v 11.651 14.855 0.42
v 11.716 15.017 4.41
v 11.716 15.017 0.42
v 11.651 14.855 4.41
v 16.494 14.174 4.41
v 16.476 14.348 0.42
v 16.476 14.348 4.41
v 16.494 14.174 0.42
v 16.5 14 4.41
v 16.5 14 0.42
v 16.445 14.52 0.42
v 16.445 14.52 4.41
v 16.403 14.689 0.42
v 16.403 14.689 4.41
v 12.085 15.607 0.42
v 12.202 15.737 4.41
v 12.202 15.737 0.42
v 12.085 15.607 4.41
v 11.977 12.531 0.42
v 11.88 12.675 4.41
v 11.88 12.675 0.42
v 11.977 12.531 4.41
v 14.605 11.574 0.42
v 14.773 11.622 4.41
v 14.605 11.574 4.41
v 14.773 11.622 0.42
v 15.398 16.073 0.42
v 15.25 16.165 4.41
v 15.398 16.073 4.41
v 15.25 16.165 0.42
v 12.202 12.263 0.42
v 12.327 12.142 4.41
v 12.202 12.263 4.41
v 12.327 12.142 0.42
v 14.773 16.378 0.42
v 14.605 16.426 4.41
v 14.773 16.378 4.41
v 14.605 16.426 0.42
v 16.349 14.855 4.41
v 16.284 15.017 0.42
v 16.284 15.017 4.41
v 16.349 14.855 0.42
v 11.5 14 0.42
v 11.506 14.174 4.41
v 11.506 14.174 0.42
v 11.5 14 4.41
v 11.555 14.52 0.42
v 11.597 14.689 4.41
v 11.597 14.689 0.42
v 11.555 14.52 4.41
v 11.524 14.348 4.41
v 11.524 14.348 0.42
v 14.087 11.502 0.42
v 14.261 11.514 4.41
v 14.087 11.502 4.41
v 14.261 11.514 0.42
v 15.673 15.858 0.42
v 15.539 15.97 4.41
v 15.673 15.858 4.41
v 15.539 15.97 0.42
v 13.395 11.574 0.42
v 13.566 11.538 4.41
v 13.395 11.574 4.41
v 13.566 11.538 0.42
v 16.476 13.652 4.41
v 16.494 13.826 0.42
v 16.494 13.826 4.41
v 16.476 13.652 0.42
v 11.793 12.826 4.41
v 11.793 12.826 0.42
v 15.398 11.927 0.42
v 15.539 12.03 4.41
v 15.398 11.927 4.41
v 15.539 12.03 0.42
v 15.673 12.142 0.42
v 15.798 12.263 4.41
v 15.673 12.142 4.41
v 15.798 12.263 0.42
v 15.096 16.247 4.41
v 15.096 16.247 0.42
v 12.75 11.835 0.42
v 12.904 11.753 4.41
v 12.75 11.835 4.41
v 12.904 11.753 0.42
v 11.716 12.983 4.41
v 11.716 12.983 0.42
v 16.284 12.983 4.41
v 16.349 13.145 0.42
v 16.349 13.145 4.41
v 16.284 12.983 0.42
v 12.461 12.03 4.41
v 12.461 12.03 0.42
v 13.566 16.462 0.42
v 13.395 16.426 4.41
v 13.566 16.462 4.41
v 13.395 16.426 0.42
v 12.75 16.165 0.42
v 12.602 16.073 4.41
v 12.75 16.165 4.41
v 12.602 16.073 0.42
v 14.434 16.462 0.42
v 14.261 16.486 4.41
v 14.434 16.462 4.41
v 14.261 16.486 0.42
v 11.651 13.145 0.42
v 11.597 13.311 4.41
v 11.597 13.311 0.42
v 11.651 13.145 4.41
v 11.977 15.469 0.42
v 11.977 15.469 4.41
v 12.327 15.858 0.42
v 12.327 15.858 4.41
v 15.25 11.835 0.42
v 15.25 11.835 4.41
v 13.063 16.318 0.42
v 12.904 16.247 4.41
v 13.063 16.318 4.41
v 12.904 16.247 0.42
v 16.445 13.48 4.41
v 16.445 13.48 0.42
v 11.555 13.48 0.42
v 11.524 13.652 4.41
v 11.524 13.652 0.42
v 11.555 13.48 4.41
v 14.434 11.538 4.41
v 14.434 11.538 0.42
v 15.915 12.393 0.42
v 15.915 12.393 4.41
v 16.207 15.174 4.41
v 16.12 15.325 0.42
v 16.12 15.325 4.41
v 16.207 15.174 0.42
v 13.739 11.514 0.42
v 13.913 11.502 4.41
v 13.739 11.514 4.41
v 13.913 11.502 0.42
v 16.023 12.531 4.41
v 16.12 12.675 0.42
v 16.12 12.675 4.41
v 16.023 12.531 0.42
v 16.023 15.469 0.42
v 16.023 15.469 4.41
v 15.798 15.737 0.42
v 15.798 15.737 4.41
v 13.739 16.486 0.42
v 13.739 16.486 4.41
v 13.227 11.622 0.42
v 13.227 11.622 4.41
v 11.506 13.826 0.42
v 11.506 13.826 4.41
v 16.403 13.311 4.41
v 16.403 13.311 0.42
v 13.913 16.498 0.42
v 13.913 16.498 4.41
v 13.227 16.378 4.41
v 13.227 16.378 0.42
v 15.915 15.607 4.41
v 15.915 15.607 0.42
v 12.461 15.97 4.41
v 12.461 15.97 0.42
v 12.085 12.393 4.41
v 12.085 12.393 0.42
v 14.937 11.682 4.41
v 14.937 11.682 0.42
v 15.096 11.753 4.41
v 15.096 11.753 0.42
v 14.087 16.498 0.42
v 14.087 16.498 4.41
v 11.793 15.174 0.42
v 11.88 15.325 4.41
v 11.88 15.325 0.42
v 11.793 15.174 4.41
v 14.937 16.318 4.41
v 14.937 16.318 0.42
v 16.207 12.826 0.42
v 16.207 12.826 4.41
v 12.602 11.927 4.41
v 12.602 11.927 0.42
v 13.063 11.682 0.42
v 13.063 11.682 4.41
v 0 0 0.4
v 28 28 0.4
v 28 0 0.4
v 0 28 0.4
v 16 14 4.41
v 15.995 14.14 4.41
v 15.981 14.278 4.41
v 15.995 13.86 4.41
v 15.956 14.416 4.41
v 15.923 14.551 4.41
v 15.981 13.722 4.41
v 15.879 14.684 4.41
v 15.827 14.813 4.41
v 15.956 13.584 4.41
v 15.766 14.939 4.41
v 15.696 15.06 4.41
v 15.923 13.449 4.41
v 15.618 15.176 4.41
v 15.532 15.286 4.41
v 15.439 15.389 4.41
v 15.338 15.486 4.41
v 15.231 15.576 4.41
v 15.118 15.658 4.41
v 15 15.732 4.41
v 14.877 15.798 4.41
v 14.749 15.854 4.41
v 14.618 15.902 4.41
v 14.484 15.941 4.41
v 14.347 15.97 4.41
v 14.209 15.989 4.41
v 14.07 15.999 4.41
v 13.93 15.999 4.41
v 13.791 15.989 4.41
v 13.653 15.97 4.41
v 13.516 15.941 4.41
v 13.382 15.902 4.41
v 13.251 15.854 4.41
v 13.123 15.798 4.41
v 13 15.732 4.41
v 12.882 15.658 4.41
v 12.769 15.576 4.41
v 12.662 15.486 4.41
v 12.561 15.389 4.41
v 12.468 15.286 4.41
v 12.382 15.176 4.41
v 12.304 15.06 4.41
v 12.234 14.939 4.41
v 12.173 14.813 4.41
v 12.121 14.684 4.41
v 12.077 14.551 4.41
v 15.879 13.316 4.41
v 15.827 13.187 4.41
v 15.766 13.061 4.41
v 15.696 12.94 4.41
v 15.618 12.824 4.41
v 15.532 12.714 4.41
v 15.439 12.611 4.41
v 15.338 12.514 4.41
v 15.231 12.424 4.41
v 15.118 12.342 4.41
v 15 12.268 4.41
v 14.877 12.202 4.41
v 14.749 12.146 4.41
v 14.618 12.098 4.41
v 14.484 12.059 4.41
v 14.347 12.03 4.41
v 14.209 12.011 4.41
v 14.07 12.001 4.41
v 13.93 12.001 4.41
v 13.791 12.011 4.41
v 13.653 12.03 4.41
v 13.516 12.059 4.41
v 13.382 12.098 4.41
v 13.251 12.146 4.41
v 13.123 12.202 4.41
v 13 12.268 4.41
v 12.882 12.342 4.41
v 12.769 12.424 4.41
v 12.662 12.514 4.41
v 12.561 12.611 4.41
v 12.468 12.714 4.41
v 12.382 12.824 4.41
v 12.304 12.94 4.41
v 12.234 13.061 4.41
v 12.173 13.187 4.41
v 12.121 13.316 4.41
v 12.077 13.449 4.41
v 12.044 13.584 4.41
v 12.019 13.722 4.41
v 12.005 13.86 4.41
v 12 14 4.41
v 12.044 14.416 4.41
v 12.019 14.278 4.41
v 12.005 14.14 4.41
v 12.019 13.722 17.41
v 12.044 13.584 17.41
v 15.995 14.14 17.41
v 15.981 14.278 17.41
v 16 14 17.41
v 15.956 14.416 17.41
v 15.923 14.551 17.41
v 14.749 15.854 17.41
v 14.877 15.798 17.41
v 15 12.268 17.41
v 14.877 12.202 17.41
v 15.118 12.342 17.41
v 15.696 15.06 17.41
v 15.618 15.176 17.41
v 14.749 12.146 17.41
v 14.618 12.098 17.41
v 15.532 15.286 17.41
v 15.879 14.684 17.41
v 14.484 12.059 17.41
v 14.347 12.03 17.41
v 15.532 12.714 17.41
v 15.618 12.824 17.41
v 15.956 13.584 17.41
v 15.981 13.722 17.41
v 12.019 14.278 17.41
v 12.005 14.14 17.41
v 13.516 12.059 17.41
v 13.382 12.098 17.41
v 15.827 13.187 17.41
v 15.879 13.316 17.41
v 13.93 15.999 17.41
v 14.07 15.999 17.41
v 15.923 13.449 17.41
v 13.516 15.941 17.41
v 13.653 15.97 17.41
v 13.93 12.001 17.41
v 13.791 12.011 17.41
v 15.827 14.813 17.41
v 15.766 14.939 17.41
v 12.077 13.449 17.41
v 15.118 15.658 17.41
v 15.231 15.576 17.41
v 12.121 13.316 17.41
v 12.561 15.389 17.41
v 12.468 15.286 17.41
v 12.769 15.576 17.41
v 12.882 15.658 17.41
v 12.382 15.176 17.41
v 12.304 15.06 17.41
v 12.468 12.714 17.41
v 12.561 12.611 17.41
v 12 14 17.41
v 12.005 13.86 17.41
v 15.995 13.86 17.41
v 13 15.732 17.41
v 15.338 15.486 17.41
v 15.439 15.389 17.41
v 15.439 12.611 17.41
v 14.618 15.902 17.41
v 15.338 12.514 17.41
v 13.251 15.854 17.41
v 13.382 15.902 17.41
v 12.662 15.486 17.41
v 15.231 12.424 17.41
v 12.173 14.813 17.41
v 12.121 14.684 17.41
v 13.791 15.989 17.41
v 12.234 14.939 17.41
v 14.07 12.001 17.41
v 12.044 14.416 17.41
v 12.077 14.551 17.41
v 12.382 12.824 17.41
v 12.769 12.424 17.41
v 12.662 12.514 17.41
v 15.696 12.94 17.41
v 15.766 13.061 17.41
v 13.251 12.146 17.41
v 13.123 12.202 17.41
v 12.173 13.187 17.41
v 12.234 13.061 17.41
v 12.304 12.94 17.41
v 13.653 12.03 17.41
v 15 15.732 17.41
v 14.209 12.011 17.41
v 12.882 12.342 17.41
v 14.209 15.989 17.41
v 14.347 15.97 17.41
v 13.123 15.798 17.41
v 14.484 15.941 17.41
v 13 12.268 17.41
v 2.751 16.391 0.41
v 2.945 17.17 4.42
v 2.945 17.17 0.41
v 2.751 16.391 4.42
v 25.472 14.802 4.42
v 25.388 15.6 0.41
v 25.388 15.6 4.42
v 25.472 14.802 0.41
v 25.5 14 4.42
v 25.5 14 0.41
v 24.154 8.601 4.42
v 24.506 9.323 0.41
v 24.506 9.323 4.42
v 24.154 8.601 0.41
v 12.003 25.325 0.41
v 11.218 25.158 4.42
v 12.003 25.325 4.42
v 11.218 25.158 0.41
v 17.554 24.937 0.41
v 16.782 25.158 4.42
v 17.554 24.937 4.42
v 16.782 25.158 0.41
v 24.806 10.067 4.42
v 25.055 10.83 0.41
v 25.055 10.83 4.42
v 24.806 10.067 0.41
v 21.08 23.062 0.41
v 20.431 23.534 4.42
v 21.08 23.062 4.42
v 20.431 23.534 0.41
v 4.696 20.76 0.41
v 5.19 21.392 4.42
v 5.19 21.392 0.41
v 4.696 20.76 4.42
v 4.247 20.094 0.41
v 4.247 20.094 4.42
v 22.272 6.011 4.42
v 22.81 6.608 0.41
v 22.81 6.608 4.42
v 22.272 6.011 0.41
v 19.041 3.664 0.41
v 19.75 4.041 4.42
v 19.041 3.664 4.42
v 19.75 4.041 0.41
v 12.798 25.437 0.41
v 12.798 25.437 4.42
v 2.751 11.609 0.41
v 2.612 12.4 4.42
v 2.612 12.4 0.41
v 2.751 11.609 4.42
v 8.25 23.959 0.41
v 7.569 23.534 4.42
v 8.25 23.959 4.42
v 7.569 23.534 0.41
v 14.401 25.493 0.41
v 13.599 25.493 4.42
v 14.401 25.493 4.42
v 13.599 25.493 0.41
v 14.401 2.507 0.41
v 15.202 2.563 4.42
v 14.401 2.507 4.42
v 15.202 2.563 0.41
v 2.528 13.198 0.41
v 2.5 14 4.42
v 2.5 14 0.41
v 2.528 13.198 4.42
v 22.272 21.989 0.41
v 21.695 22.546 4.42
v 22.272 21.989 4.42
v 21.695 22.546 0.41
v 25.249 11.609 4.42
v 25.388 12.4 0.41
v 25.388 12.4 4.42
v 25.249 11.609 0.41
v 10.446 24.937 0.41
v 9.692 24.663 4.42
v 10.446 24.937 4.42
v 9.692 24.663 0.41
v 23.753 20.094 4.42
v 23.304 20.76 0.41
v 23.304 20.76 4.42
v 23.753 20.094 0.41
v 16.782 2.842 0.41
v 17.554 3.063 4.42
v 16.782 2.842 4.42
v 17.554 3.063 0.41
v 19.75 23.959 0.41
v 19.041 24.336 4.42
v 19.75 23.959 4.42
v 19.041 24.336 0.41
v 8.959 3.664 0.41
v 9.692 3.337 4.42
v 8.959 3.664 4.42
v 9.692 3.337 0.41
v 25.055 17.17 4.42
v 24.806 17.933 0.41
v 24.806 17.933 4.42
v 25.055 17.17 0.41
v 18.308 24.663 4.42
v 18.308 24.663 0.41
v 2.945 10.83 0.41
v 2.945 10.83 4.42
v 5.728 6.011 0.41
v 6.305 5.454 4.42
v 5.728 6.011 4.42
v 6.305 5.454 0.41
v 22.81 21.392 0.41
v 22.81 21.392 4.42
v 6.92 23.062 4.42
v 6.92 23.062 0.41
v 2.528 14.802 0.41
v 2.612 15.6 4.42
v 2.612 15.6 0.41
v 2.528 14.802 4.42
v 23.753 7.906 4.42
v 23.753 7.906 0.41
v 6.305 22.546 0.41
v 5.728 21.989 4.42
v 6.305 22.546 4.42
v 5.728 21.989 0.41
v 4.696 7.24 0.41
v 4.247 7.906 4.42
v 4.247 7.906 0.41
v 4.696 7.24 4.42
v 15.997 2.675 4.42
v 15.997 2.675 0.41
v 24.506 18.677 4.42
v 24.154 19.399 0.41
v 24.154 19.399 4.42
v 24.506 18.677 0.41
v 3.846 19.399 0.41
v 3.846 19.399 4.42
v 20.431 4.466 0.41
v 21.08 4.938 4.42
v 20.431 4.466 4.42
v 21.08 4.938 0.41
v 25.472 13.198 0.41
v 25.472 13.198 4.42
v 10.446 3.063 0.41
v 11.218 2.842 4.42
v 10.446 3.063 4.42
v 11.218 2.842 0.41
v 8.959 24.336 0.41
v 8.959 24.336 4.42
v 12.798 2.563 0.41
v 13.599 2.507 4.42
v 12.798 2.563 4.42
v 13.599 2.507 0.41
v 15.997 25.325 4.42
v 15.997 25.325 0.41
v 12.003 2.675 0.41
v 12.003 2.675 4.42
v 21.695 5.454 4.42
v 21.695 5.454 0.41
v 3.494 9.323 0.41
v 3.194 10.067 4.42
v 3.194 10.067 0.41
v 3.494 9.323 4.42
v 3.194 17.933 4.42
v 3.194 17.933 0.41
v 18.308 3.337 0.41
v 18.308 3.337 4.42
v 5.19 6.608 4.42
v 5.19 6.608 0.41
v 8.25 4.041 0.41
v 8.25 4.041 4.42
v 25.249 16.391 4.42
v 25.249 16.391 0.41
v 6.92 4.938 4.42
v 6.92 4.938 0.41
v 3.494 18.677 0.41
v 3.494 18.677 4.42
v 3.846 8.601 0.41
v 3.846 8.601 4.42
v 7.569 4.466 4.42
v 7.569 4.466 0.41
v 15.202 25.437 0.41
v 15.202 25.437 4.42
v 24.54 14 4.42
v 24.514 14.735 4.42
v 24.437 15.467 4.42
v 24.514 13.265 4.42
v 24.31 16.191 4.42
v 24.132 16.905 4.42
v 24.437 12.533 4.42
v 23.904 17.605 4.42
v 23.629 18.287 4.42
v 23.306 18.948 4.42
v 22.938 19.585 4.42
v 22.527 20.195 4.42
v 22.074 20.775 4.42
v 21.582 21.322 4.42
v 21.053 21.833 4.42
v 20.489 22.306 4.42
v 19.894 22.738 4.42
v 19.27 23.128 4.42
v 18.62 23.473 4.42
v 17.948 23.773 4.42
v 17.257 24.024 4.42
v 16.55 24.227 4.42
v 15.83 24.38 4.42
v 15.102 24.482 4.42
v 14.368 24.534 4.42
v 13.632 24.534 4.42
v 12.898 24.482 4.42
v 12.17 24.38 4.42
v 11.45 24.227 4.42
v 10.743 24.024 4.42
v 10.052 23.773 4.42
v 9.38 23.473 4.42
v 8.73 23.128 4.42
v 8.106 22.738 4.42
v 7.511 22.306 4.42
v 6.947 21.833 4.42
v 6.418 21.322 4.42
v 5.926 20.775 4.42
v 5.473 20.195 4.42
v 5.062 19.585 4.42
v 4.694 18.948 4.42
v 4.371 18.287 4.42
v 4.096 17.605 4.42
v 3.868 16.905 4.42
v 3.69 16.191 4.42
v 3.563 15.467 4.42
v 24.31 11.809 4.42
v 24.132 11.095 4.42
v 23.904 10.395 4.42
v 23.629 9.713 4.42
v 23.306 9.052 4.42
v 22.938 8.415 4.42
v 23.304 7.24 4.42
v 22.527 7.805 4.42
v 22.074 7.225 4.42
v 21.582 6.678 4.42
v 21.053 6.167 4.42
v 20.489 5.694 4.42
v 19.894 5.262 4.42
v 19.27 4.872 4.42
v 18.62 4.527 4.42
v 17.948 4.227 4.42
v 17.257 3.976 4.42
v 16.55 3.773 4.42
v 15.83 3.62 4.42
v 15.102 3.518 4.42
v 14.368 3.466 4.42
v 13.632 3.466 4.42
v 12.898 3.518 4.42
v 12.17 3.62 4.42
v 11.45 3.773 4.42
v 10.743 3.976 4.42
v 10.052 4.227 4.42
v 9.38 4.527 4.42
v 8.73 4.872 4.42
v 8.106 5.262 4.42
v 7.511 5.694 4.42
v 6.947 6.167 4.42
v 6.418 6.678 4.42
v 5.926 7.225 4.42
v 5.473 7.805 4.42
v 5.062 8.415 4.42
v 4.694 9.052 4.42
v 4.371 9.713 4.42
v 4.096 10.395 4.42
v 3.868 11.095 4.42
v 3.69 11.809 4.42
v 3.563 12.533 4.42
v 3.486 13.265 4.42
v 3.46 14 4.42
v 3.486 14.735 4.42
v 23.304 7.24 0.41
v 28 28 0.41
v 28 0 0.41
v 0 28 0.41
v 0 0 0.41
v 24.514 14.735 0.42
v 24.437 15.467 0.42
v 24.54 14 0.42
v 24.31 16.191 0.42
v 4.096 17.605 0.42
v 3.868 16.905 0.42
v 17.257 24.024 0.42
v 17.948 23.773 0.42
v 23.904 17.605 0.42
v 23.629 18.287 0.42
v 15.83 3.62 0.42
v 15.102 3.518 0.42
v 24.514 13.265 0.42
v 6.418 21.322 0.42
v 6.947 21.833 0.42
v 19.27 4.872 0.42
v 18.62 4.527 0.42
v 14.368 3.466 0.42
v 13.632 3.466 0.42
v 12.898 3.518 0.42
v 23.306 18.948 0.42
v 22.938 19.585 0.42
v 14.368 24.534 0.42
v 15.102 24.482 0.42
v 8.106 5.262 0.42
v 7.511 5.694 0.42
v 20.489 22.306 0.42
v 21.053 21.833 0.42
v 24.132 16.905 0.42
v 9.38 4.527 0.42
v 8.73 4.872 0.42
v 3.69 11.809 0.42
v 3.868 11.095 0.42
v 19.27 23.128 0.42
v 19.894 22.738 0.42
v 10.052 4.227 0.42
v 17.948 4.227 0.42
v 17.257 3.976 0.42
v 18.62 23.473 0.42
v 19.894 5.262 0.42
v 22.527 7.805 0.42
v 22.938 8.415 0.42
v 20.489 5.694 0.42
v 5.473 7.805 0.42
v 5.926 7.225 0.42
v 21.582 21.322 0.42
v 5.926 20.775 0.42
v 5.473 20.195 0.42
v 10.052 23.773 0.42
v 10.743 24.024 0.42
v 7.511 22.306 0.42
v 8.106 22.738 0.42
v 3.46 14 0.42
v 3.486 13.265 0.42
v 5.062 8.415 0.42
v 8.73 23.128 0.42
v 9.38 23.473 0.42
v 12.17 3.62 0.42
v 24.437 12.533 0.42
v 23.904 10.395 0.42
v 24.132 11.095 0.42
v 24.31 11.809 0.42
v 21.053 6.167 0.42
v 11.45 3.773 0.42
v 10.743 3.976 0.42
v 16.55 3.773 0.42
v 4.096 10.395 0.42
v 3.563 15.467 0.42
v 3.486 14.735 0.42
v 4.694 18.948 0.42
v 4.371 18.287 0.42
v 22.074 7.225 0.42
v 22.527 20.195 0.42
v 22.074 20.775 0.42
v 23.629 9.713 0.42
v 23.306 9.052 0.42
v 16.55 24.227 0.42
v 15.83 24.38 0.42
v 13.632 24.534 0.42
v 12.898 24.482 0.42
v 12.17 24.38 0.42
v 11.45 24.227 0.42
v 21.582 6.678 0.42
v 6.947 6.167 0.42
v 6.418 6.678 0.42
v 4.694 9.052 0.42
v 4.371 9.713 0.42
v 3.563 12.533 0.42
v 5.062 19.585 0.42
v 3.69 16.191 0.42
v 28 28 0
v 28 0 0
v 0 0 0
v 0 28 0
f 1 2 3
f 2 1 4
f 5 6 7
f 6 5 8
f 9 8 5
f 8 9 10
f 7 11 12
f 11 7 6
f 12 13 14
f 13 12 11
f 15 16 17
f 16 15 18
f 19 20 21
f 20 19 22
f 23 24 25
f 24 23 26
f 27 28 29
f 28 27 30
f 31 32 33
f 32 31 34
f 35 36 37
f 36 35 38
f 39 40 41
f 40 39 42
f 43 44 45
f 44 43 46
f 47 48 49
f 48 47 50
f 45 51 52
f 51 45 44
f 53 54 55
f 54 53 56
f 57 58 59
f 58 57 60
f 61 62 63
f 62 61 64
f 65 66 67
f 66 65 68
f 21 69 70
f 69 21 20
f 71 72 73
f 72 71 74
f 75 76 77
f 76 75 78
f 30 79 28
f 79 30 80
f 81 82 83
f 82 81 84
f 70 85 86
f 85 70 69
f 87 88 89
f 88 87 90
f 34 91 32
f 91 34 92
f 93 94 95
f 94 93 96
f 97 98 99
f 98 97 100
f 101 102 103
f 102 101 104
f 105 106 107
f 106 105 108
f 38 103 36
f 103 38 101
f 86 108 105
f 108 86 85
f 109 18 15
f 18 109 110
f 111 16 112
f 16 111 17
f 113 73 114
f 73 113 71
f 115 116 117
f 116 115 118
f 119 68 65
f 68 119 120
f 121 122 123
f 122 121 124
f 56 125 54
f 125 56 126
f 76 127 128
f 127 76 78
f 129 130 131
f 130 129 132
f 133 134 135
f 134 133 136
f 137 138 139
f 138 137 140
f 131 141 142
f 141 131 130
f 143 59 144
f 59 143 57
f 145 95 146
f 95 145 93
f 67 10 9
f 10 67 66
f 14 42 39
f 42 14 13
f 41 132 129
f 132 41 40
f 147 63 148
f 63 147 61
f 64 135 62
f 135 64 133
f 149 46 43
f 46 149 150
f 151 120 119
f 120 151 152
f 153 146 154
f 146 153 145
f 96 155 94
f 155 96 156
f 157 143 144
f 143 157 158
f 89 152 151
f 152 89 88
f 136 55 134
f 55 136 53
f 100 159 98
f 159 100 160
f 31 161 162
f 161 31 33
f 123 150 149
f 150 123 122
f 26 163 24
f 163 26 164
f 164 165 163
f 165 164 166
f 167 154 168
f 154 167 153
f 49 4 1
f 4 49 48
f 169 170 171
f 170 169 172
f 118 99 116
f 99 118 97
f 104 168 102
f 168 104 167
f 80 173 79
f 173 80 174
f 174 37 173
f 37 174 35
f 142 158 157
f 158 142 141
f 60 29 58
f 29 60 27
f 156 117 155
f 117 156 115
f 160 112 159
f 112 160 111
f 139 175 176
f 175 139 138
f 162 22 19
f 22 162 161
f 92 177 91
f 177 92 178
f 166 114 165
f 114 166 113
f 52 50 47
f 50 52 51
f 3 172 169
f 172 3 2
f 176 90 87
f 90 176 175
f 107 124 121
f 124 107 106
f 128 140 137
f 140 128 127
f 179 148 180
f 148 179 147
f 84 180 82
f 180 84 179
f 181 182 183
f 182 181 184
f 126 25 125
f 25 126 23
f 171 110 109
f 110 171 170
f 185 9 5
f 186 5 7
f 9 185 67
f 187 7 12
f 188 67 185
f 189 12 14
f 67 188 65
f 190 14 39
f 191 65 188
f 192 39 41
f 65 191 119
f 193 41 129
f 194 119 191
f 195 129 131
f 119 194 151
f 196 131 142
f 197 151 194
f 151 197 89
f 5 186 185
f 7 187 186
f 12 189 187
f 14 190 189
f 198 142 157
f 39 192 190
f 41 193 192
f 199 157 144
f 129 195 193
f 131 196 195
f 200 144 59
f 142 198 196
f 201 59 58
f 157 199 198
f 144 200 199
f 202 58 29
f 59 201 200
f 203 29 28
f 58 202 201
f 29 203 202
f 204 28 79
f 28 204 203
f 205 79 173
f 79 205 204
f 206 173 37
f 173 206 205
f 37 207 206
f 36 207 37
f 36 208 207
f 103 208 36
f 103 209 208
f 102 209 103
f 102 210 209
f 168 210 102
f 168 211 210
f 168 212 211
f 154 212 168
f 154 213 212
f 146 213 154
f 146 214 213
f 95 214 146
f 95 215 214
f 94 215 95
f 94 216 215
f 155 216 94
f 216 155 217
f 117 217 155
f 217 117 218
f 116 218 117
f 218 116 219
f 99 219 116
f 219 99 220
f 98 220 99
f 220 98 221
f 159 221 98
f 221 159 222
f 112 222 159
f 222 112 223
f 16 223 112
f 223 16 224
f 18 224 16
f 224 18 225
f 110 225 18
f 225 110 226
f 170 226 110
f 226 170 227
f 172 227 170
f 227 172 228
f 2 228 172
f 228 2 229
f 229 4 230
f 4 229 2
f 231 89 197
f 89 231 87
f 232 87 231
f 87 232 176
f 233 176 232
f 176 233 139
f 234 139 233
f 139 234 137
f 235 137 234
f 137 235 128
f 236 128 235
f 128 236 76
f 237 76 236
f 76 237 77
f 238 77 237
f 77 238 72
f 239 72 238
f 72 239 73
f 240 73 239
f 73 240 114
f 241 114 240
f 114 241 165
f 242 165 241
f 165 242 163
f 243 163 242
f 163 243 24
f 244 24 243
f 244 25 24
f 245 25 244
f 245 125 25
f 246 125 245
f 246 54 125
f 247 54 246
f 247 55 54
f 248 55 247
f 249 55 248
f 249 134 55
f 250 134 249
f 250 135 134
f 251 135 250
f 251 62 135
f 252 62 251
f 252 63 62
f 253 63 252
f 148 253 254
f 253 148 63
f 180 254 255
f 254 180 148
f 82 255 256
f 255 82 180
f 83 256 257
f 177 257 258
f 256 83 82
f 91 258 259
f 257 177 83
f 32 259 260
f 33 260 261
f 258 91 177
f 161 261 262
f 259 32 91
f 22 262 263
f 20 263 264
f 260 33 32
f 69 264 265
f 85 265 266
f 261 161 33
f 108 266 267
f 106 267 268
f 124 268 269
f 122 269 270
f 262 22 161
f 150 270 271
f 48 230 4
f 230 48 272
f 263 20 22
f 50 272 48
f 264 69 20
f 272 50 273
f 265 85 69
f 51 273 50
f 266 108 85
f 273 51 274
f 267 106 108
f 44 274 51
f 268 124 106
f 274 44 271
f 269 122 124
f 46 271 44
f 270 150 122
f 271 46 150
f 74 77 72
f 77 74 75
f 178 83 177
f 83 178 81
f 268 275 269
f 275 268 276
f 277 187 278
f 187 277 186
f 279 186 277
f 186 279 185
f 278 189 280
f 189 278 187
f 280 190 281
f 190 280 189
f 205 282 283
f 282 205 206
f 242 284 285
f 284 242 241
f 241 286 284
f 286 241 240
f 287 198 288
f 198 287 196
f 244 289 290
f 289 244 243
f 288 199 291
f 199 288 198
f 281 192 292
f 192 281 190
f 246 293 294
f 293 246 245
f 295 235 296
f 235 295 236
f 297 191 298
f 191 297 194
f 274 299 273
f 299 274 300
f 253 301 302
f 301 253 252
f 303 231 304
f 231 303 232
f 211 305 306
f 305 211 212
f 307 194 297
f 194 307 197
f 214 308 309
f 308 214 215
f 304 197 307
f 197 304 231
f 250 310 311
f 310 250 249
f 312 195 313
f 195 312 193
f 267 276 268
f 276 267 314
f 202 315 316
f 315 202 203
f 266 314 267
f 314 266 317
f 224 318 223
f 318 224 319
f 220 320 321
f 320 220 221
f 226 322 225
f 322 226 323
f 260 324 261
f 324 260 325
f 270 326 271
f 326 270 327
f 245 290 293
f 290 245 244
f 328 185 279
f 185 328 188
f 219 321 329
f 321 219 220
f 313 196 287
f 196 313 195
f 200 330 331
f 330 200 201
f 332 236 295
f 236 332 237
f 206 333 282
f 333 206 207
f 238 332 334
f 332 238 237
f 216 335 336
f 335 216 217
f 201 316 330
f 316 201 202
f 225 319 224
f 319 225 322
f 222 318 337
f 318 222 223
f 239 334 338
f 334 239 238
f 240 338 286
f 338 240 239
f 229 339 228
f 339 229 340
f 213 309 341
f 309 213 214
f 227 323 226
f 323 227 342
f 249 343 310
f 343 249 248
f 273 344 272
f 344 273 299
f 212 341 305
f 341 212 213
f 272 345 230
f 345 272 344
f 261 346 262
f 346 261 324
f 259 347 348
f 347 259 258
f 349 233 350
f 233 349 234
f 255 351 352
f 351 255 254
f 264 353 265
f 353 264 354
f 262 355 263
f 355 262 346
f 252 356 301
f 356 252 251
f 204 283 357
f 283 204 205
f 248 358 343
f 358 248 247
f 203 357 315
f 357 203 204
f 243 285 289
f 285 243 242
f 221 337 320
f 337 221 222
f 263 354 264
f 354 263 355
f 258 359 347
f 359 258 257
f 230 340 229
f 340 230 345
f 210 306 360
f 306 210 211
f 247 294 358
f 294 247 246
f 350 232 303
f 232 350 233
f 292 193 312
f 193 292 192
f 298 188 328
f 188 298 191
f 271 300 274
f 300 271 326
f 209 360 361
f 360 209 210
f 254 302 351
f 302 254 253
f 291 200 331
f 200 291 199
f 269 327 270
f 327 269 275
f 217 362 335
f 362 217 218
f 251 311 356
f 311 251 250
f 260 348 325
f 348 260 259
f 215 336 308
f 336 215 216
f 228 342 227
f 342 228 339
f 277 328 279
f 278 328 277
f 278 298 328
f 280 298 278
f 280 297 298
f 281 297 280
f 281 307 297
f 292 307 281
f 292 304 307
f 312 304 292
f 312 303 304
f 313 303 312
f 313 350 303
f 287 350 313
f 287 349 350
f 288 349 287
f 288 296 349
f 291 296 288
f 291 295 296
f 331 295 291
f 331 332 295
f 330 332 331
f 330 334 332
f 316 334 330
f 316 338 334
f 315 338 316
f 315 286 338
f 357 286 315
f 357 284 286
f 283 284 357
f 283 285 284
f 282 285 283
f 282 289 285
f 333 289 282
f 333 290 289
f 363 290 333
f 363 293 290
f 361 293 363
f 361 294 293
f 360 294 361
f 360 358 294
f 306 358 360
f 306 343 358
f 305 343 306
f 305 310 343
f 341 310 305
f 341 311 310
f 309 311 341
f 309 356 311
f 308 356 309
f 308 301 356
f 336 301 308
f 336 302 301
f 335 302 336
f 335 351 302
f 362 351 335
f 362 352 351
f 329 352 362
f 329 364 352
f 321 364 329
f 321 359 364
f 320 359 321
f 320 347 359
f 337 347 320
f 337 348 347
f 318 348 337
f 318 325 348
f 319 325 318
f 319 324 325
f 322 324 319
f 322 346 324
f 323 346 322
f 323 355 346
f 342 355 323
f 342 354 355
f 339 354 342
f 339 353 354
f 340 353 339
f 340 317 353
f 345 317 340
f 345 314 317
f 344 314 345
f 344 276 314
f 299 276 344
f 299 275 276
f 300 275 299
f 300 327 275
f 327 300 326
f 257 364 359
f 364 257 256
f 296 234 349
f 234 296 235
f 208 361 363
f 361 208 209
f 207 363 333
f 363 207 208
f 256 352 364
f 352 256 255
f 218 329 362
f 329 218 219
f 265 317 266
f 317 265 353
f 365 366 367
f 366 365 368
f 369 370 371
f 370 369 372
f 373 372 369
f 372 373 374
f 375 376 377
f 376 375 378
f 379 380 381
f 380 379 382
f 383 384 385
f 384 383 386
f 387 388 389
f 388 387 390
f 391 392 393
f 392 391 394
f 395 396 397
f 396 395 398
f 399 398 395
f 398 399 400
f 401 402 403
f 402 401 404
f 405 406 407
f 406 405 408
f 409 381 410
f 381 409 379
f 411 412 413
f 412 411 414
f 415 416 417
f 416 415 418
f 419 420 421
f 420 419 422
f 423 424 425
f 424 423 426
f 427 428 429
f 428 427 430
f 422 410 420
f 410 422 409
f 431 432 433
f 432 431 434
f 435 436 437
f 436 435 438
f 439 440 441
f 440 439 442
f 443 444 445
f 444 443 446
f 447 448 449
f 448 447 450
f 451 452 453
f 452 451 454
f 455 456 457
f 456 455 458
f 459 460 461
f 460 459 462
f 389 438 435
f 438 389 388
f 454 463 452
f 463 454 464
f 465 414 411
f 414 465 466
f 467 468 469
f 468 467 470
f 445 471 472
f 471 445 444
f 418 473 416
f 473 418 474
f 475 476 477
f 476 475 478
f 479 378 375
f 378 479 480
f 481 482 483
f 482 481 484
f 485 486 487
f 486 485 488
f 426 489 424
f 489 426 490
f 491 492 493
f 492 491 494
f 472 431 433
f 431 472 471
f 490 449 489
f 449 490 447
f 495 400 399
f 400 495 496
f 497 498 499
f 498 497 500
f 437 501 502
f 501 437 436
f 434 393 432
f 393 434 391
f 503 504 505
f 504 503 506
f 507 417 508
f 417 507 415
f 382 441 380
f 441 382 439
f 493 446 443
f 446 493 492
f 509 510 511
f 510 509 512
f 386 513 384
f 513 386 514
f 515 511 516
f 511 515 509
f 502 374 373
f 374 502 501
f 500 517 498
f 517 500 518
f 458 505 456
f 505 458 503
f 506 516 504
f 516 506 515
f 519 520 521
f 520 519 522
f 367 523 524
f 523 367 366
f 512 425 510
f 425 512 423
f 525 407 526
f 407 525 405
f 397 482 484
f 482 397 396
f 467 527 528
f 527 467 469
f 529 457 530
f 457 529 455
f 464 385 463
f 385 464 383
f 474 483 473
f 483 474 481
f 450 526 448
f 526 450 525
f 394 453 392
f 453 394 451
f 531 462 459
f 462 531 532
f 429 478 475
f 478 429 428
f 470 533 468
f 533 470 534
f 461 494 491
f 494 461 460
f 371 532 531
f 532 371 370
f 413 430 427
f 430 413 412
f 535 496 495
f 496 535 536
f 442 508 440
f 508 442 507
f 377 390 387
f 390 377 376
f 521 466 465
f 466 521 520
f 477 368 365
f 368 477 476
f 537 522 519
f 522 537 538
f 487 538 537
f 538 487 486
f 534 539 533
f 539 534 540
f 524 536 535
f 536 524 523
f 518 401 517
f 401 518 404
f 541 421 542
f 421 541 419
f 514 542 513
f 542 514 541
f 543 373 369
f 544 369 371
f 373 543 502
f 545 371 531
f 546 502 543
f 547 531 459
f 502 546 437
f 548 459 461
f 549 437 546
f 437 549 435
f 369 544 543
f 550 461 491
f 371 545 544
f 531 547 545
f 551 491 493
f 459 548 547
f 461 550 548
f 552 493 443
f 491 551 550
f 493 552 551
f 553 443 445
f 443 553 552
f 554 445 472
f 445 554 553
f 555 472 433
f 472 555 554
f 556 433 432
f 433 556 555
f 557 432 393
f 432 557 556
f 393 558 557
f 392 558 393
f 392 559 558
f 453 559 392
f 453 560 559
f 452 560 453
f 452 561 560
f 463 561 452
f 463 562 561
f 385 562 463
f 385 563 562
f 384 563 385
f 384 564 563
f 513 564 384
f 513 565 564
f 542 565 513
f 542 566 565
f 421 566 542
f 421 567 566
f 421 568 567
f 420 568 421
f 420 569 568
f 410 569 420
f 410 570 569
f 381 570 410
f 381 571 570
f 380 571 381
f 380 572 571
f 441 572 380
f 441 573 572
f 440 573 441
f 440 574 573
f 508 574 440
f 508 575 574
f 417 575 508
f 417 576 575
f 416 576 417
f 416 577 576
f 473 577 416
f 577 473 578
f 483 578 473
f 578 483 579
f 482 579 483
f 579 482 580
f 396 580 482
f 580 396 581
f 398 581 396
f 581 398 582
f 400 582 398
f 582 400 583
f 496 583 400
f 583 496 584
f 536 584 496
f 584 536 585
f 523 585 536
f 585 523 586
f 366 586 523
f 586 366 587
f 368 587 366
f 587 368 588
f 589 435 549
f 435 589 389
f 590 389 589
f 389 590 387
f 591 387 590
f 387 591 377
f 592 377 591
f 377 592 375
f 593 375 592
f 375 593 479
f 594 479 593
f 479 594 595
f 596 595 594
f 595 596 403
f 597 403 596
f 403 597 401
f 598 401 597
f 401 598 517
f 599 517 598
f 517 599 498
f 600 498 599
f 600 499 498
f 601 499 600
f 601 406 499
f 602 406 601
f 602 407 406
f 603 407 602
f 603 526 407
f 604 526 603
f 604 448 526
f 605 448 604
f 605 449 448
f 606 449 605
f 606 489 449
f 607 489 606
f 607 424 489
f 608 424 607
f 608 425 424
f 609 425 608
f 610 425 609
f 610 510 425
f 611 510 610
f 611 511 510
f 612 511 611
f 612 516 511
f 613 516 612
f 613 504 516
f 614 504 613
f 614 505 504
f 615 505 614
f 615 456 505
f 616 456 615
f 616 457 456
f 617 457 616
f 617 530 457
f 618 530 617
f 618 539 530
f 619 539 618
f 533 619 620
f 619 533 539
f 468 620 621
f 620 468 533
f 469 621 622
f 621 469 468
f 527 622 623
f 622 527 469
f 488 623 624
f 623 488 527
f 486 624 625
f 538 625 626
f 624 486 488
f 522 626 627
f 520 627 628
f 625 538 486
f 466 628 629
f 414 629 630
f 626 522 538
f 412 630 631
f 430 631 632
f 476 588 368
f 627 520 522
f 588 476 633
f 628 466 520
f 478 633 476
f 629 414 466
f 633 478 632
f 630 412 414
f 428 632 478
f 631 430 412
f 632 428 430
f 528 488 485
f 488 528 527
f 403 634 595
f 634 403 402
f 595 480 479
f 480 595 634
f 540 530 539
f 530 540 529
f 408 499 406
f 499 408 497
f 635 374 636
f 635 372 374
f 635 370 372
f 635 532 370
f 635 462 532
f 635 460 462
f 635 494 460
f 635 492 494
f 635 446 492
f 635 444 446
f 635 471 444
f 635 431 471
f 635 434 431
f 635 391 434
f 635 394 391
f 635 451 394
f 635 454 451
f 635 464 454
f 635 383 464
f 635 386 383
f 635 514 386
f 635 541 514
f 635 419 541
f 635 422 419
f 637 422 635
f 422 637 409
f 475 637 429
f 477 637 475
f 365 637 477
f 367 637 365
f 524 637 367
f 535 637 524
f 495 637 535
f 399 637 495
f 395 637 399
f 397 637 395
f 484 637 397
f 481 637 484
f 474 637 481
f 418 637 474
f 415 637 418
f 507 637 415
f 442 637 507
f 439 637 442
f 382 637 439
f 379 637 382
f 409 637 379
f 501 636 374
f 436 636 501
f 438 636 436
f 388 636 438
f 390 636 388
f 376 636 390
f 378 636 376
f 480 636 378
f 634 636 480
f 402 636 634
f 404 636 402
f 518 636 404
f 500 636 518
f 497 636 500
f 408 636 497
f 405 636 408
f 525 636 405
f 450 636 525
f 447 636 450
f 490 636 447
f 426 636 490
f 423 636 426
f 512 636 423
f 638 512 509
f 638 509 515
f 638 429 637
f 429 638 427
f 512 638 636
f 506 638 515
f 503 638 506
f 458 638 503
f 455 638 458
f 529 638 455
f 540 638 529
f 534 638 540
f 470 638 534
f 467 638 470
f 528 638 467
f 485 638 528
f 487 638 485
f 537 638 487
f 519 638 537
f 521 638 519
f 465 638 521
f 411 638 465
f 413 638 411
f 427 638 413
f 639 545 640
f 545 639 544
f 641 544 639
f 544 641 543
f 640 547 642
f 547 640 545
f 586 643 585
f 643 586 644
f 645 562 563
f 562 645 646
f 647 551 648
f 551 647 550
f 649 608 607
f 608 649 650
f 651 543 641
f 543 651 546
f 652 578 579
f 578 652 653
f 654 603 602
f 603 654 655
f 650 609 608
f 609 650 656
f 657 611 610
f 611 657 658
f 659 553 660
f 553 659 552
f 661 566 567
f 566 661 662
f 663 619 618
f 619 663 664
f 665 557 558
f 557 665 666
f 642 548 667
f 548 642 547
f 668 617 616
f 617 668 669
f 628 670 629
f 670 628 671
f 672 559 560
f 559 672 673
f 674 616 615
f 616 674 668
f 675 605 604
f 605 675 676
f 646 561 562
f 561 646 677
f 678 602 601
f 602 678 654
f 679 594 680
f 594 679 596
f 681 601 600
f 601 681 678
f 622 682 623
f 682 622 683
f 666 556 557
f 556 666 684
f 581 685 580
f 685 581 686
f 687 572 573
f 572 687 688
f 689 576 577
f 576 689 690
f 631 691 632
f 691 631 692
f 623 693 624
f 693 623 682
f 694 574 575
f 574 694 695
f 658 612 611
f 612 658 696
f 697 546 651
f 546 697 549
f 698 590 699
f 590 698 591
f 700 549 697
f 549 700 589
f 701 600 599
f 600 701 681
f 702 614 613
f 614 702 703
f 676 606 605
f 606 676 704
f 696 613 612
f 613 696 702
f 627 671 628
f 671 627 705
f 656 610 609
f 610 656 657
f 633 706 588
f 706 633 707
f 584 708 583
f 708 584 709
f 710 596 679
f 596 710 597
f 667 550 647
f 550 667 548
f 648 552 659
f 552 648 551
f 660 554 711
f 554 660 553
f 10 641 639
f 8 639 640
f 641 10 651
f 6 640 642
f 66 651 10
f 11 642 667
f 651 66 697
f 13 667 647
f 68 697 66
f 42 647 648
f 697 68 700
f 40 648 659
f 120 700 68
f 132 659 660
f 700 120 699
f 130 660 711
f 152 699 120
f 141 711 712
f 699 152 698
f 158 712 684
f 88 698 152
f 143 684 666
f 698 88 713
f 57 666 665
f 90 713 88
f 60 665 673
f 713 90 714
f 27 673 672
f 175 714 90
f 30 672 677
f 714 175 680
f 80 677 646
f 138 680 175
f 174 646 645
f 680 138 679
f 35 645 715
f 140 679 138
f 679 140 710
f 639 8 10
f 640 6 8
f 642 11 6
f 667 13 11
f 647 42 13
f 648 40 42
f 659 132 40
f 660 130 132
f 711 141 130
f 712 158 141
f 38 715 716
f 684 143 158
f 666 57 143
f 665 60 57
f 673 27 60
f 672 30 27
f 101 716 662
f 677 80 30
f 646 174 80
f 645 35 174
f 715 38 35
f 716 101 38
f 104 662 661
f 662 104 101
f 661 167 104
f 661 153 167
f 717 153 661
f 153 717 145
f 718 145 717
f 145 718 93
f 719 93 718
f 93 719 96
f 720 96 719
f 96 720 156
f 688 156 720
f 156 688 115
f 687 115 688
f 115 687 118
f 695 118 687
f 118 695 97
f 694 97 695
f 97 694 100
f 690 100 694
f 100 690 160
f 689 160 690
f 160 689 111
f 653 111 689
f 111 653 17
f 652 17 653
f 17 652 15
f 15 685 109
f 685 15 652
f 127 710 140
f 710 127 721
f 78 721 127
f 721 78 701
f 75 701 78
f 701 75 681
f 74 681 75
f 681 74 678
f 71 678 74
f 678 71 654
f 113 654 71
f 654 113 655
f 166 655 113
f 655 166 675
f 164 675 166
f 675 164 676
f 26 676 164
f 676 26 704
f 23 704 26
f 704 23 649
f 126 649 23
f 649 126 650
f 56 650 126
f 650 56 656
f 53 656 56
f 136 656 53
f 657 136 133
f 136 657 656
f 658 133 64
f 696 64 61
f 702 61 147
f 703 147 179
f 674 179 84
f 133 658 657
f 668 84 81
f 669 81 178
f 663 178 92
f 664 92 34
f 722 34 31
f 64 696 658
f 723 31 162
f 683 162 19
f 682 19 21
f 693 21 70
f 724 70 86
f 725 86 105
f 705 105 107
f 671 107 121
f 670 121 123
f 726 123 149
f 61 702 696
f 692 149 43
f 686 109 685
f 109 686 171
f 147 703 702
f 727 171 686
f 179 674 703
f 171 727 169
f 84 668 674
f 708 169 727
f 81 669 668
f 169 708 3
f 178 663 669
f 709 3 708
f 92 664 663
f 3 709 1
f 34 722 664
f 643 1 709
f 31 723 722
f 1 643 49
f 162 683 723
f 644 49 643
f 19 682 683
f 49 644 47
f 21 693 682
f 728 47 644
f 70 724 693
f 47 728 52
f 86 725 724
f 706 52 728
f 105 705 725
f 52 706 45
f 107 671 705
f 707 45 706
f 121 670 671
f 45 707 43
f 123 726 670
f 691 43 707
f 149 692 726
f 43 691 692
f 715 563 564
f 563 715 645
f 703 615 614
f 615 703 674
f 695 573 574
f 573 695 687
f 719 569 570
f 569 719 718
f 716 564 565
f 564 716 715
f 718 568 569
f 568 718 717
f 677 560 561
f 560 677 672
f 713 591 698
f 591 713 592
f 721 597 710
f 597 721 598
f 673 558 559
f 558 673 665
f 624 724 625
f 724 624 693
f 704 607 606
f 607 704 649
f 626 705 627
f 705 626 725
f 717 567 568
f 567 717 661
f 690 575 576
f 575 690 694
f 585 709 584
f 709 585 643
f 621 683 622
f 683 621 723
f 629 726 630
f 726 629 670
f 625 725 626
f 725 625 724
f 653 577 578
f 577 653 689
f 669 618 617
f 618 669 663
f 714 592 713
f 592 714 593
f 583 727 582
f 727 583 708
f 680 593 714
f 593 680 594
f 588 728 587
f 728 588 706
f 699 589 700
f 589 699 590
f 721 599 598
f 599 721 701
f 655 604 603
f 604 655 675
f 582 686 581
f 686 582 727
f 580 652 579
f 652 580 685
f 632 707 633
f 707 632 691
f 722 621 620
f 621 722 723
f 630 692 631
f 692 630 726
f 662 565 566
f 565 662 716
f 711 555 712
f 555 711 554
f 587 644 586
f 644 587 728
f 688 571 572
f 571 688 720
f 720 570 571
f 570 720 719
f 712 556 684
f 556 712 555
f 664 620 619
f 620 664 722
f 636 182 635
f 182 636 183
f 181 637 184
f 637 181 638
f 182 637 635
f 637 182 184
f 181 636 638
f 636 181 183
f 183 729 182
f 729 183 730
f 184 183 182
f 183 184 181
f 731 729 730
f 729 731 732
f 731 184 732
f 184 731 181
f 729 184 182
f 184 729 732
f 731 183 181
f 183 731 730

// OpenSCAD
// file: ../../Base/PlacementOptions.scad
// Fischertechnik Box Foundation
// Placement Options

// Alignment
NoAlign = 0;
AlignLeft = 1;
AlignBottom = 2;
AlignCenter = 3;
AlignRight = 4;
AlignTop = 5;

// Element rotation degree steps
rotations = [0, -90, -180, -270];

// Rotation
NoRotation = 0;
Rotate0 = 0;
Rotate90 = 1;
Rotate180 = 2;
Rotate270 = 3;

// Docking (seen from above)
NoDock = -1;
DockLeft = 0;
DockTop = 1;
DockRight = 2;
DockCorner = 2;
DockBottom = 3;

// Web corners
LowerLeft = 0;
UpperLeft = 1;
UpperRight = 2;
LowerRight = 3;

// Web position relative to corner
LeftOfCorner = 0;
RightOfCorner = 1;
// file: ../../Base/Boxes.scad
// Fischertechnik Box Foundation
// Pre-designed Boxes

use <Constants.scad>

include <PlacementOptions.scad>

box190Width = 190;
box190Depth = 130;
box130Width = 130;
box130Depth = 95;

// Values are from an original ec3 box
topBottomDifference = 1.5;
outerHeight = 40;
innerHeight = 38.2;
baseThickness = outerHeight - innerHeight;
stackExcess = 5.7;
radius = 3.5;
wallThickness = 1.5;
tolerance = 0.2;
stackOffset = innerHeight - stackExcess;

boxUsageHeight = stackOffset;
boxWallThickness = wallThickness;
boxBaseThickness = baseThickness;
boxWebWidth = 3.0;

// getBoxWallThickness()
// Gets the wall thickness of a Fischertechnik Box
function getBoxWallThickness() = boxWallThickness;

// getBoxUsageHeight()
// Gets the usable height of a Fischertechnik box
function getBoxUsageHeight() = boxUsageHeight;

// getBoxInnerHeight()
// Gets the inner height of a Fischertechnik box, including the stack excess
function getBoxInnerHeight() = innerHeight;

// getBoxBaseThickness()
// Gets the thickness of the Fischertechnik box base.
function getBoxBaseThickness() = boxBaseThickness;

// getBoxWebWidth()
// Gets the width of a box web
function getBoxWebWidth() = boxWebWidth;

// getBox190Space()
// Gets the usable inner space of a Box 190 as an x/y-list
function getBox190Space() = [
    box190Width - 2*getBoxWallThickness() - topBottomDifference, 
    box190Depth - 2*getBoxWallThickness() - topBottomDifference ];

// BoxBase(width, depth)
// Creates an empty stackable Fischertechnik compatible box
// width = Outer width of the box (190, 130, ...)
// depth = Outer depth of the box (130, 95, ...)

module BoxBase(width, depth, height=outerHeight) {    
    thinPlate = 0.01;

    innerHeight = height - baseThickness;    
    
    module BodyPlate(width, depth) {
        translate([radius, radius])
        hull() {
            w = width-2*radius;
            d = depth-2*radius;
            cube([w, d, thinPlate]);
            cylinder(thinPlate, r=radius, $fn=getFragments());
            translate([w, 0])
                cylinder(thinPlate, r=radius, $fn=getFragments());
            translate([w, d])
                cylinder(thinPlate, r=radius, $fn=getFragments());
            translate([0, d])
                cylinder(thinPlate, r=radius, $fn=getFragments());
        }
    }
    
    module Body(tolerance=tolerance) {
        hull() {
            // Bottom with tolerance to fit into the original boxes when stacked
            translate([-wallThickness+tolerance, -wallThickness+tolerance, -baseThickness])
                BodyPlate(width-topBottomDifference-2*tolerance, depth-topBottomDifference-2*tolerance);
            
            // Top
            translate([-wallThickness-topBottomDifference/2, -wallThickness-topBottomDifference/2, innerHeight-thinPlate])
                BodyPlate(width, depth);
         }
    }

    module Cutoff() {
        hull() {
            coWidth = width - 2*wallThickness;
            coDepth = depth - 2*wallThickness;
            
            // Bottom
            BodyPlate(coWidth-topBottomDifference, coDepth-topBottomDifference);

            // Top
            translate([-topBottomDifference/2, -topBottomDifference/2, innerHeight+thinPlate]) 
                BodyPlate(coWidth, coDepth);
        }
    }
    
    difference() {        
        Body();
        Cutoff();
        stackOffset = innerHeight - stackExcess;
        translate([0, 0, stackOffset + baseThickness])
            Body(tolerance=0);
    }
}

// Creates the Fischertechnik empty box 130x190 mm and places it at position 0,0
// 190x130 are the outer sizes, the inner space is slightly smaller. Use getBox190Space() to get the inner sizes.
// The box is positioned that the usable inner space is at the 0,0,0 position. The

module Box190() {
    BoxBase(box190Width, box190Depth);
}

// Gets the usable inner space of a Box 130 as an x/y-list
function getBox130Space() = [
    box130Width - 2*getBoxWallThickness() - topBottomDifference, 
    box130Depth - 2*getBoxWallThickness() - topBottomDifference ];

// Creates the Fischertechnik empty box 95x130 mm and places it at position 0,0
// 190x130 are the outer sizes, the inner space is slightly smaller. Use getBox190Space() to get the inner sizes.
// The box is positioned that the usable inner space is at the 0,0,0 position. The

module Box130() {
    BoxBase(box130Width, box130Depth);
}

// Creates a web at the specified box walls
// corner 0 = LowerLeft, 1 = UpperLeft, 2 = UpperRight, 3 = LowerRight
// side 0 = LeftOfCorner, 1 = RightOfCorner
// distance = Distance in mm from the corner
// boxSpace = inner width and depth of the box (default: Box 190)
// webWidth = length of the web (default is 3 mms)
// webThickness = thickness of the web (default is 1 mm)

module BoxWeb(corner, side, distance, boxSpace=getBox190Space(), webWidth=getBoxWebWidth(), webThickness=1.0) {
    sink = getBoxWallThickness()/2;

    width = (corner % 2 == 0) ? 
            (side == LeftOfCorner ? webWidth : webThickness) :
            (side == LeftOfCorner ? webThickness : webWidth);

    depth = (corner % 2 == 0) ? 
            (side == RightOfCorner ? webWidth : webThickness) :
            (side == RightOfCorner ? webThickness : webWidth);
    
    xDiff = corner == LowerLeft ? 
                (side == LeftOfCorner ? -sink : distance) :
            (corner == UpperLeft ?                
                (side == LeftOfCorner ? distance : -sink) :
            (corner == UpperRight ?
                (side == LeftOfCorner ? boxSpace.x-webWidth+sink : boxSpace.x-distance-webThickness) :
                (side == LeftOfCorner ? boxSpace.x-distance-webThickness: boxSpace.x-webWidth+sink)));

    yDiff = corner == LowerLeft ? 
                (side == RightOfCorner ? -sink : distance) :
            (corner == UpperLeft ?
                (side == RightOfCorner ? boxSpace.y-distance : boxSpace.y-webWidth+sink) :
            (corner == UpperRight ?
                (side == RightOfCorner ? boxSpace.y-webWidth+sink : boxSpace.y-distance) :
                (side == RightOfCorner ? distance : -sink)));
    
    translate([xDiff, yDiff, -getExcess()])
        cube([width, depth, boxUsageHeight + 2*getExcess()]);
}
// file: ../../Base/Rotation.scad
// Fischertechnik Box Foundation
// Geometry Helpers Rotation

include <PlacementOptions.scad>

// getRotatedSpace(space, rotation=NoRotation)
// Rotates the space dependent on the specified rotation

function getRotatedSpace(space, rotation=NoRotation) = [
    (rotation == Rotate90 || rotation == Rotate270) ? space.y : space.x,
    (rotation == Rotate90 || rotation == Rotate270) ? space.x : space.y
];

// Rotates the given space around the fixed left lower corner
// space = the space the children needs as width/depth list [width,depth]
// rotation = 0 Rotate0 degrees, 1 Rotate90 degrees, 2 Rotate180 degrees, 3 Rotate270 degrees (equivalent to -90)

module RotateFix(space, rotation=NoRotation) {
    dy = (rotation == Rotate0 || rotation == Rotate270) ? 0 :
        (rotation == Rotate90) ? space.x :
        space.y;
    dx = (rotation < Rotate180) ? 0 :
        (rotation == Rotate180) ? space.x :
        space.y;
    
    translate([dx, dy, 0])
        rotate([0, 0, rotations[rotation]])
            children();
}
// file: ../../Base/Alignment.scad
// Fischertechnik Box Foundation
// Geometry Helpers Alignment

include <PlacementOptions.scad>

// getAlignedX(elementWidth, spaceWidth, align=AlignRight, offset=0)
// Gets the aligned X offset of an element with the given
// width in the given space.
// elementWidth = The width of the element to positon
// spaceWidth = The space where the element should be aligned
// align = 0 AlignLeft, 1 AlignCenter, 2 AlignRight
// offset = an optional offset from the aligned position. When
// aligned left or centered, then positive values are in X direction.
// When aligned right then positive values are in negative X direction.

function getAlignedX(elementWidth, spaceWidth, align=AlignRight, offset=0) =
    (align == AlignLeft) ?
        offset :
        ((align == AlignCenter) ?
        (spaceWidth - elementWidth)/2 + offset :
        spaceWidth - offset - elementWidth);

// getAlignedY(elementDepth, spaceDepth, align=AlignTop, offset=0)
// Gets the aligned Y offset of an element with the given
// depth in the given space.
// elementDepth = The depth of the element to positon
// spaceDepth = The space where the element should be aligned
// align = 0 AlignBottom, 1 AlignCenter, 2 AlignTop
// offset = an optional offset from the aligned position. When
// aligned bottom or centered, then positive values are in Y direction.
// When aligned top then positive values are in negative Y direction.

function getAlignedY(elementDepth, spaceDepth, align=AlignTop, offset=0) =
    (align == AlignBottom) ?
        offset :
        ((align == AlignCenter) ?
        (spaceDepth - elementDepth)/2 + offset :
        spaceDepth - offset - elementDepth);
// file: ../../Base/Placement.scad
// Fischertechnik Box Foundation
// Geometry Helpers Placement

use <Constants.scad>
use <Alignment.scad>
use <Rotation.scad>
use <Boxes.scad>

include <PlacementOptions.scad>

// Place(x=0, y=0, elementSpace=[0,0], alignX=AlignLeft, alignY=AlignBottom, rotation=Rotate0, boxSpace=getBox190Space())
// Places the child at the specified position
// y = Y-Position. This is a relative position when an X aligment is specified.
// x = X-Position. This is a relative position when an Y aligment is specified.
// elementSpace = space of the element to be placed [x,y]
// alignX = -1=NoAlign, 0 AlignLeft, 1 AlignCenter, 3 AlignRight (elementSpace and boxSpace required!)
// alignY = -1=NoAlign, 2 AlignBottom, 1 AlignCenter, 4 AlignTop (elementSpace and boxSpace required!)
// rotation = 0 Rotate0 0 degrees, 1 Rotate90 90 degrees, 
// 2 Rotate180 180 degrees, 3 Rotate270 270 degrees (equivalent to -90)
// boxSpace = Inner space of the box where the placement occurs [x,y] - default is Box 190x130 inner space

module Place(x=0, y=0, elementSpace=[0,0], 
  alignX=AlignLeft, alignY=AlignBottom, 
  rotation=NoRotation, boxSpace=getBox190Space()) {

    module Position(x, y, space, rotation=Rotate0) {
        translate([x, y, 0])
            RotateFix(space, rotation)
                children();
    }

    space = getRotatedSpace(elementSpace, rotation);
    alignedX = getAlignedX(space.x, boxSpace.x, alignX, x);
    alignedY = getAlignedY(space.y, boxSpace.y, alignY, y);
    Position(alignedX, alignedY, elementSpace, rotation)
        children();
}

// Center(space=getBox130Space(), elementSpace=[0,0])
// space = Space where the children is centered. For cylinder use centered=true and no elementSpace.
// elementSpace = space of the element to be centered [x,y]

module Center(space=getBox190Space(), elementSpace=[0,0]) {
    Place(elementSpace=elementSpace, boxSpace=space, alignX=AlignCenter, alignY=AlignCenter)
        children();
}

// CenterHorizontal(width=0, y=0, offset=0, space=getBox130Space())
// width = Width of the element to be placed.
// y = Y position of the element
// offset = Offset from the center position (negative will be left of the center)
// space = Space where the element is placed

module CenterHorizontal(width=0, y=0, offset=0, space=getBox190Space()) {
    Place(x=offset, y=y, elementSpace=[width, 0], boxSpace=space, alignX=AlignCenter)
        children(0);
}

// CenterVertical(depth=0, x=0, offset=0, space=getBox130Space())
// depth = Depth of the element to be placed.
// x = X position of the element
// offset = Offset from the center position (negative will be down of the center)
// space = Space where the element is placed

module CenterVertical(depth=0, x=0, offset=0, space=getBox190Space()) {
    Place(x=x, y=offset, elementSpace=[0, depth], boxSpace=space, alignY=AlignCenter)
        children(0);
}

// getIsVertical(align)
// True if the specified alignment needs a vertical orientation for a divider (AlignRight, AlignLeft)

function getIsVertical(align) = (align == AlignRight || align == AlignLeft);

// getIsHorizontal(align)
// True if the specified alignment needs a horizontal orientation for a divider (AlignTop, AlignBottom)

function getIsHorizontal(align) = (align == AlignTop || align == AlignBottom);
// file: ../../Elements/AxisClip10.scad
// Fischertechnik Box Library
// Axis for clip 10
// 31023

use <../ModelBase/Simple.scad>
use <../Base/Constants.scad>

width = 12;
depth = 12;
height = 23;
upperDiameter = 3.7;

// getAxisClip10Space()
// Gets the space of a frame for a clip 10 with spring ring (mot2)

function getAxisClip10Space() = [width, depth, height];

// AxisClip10()
// Axis for clip 10 with spring ring (mot2)

module AxisClip10() {
    LeveledAxisWithSpace(height, height-10, getAxisClip10Space(), diameter=upperDiameter);
}

// Tests
color("lightgray")
AxisClip10();
// file: ../../Base/Constants.scad
// Fischertechnik Box Foundation
// Constants

// Constant values necessary for multiple elements

// Base constants
dividerThickness = 1.2;
excess = 0.01;
fragments = 90;
tolerance = 0.8;

// Gets the thickness of a divider 
function getDividerThickness() = dividerThickness;

// Gets the excess that is used to merge walls into each other
function getExcess() = excess;

// Gets amount of fragments of a cylinder
function getFragments() = fragments;

// Gets the inner tolerance of a frame to each side
function getTolerance() = tolerance;


// Fischertechnik specific constants
axisDiameter = 4;
axisBottomDiameter = axisDiameter + 1;
standardEdgeDistance = 2.5;
standardWebDistance = 11.5;
standardCornerLength = 15;
tubeWallFactor = 0.8;
smallPartsFrameHeight = 20;

// Gets axis diameter
function getAxisDiameter() = axisDiameter;

// Gets axis bottom diameter for thicker part at the bottom
function getAxisBottomDiameter() = axisBottomDiameter;

// gets the standard distance to the wall of the box for dockable frames with webs
function getStandardEdgeDistance() = standardEdgeDistance;

// gets the standard distance of each web to the corner of the dockable frame
function getStandardWebDistance() = standardWebDistance;

// gets the standard length of the corner walls of a dockable frame
function getStandardCornerLength() = standardCornerLength;

// gets the wall thickness of a tube.
function getTubeWallThickness() = tubeWallFactor * getDividerThickness();

// gets the frame height for docked small parts boxes.
function getSmallPartsFrameHeight() = smallPartsFrameHeight;
// file: ../../Elements/CylinderHub.scad
// Fischertechnik Box Library
// Cylinder and axis for hub 
// 31014

use <../Base/Constants.scad>
use <../Base/Placement.scad>
use <../ModelBase/Simple.scad>

width = 28;
depth = 28;

// getCylinderHub()
// Gets the space the cylinder for a hub needs as width and depth (.x and .y as a list)

function getCylinderHubSpace() = [width, depth];

// CylinderHub()
// Standing cylinder and axis for a hub.
// 31014

module CylinderHub() {
    diameter = 23;
    height = 4;
    axisHeight = 17;

    Space(getCylinderHubSpace());
        
    Center(getCylinderHubSpace()) {
        LeveledAxis(axisHeight, height);
        Tube(height, outerDiameter=diameter);
    }
}

// Tests
color("lightgray")
CylinderHub();
// file: ../TestPrint.scad
// 3D Print Test Base

use <../Base/Constants.scad>

use <../Elements/AxisClip10.scad>

module TestPrint(elementSpace) {
    cube([elementSpace.x, elementSpace.y, 0.4]);
    translate([0,0,0.4+getExcess()]) {
        children();
    }
}

TestPrint(getAxisClip10Space())
    AxisClip10();
// main file
// 3D Print Test
// CylinderHub

use <../TestPrint.scad>
use <../../Elements/CylinderHub.scad>

TestPrint(getCylinderHubSpace())
    CylinderHub();
